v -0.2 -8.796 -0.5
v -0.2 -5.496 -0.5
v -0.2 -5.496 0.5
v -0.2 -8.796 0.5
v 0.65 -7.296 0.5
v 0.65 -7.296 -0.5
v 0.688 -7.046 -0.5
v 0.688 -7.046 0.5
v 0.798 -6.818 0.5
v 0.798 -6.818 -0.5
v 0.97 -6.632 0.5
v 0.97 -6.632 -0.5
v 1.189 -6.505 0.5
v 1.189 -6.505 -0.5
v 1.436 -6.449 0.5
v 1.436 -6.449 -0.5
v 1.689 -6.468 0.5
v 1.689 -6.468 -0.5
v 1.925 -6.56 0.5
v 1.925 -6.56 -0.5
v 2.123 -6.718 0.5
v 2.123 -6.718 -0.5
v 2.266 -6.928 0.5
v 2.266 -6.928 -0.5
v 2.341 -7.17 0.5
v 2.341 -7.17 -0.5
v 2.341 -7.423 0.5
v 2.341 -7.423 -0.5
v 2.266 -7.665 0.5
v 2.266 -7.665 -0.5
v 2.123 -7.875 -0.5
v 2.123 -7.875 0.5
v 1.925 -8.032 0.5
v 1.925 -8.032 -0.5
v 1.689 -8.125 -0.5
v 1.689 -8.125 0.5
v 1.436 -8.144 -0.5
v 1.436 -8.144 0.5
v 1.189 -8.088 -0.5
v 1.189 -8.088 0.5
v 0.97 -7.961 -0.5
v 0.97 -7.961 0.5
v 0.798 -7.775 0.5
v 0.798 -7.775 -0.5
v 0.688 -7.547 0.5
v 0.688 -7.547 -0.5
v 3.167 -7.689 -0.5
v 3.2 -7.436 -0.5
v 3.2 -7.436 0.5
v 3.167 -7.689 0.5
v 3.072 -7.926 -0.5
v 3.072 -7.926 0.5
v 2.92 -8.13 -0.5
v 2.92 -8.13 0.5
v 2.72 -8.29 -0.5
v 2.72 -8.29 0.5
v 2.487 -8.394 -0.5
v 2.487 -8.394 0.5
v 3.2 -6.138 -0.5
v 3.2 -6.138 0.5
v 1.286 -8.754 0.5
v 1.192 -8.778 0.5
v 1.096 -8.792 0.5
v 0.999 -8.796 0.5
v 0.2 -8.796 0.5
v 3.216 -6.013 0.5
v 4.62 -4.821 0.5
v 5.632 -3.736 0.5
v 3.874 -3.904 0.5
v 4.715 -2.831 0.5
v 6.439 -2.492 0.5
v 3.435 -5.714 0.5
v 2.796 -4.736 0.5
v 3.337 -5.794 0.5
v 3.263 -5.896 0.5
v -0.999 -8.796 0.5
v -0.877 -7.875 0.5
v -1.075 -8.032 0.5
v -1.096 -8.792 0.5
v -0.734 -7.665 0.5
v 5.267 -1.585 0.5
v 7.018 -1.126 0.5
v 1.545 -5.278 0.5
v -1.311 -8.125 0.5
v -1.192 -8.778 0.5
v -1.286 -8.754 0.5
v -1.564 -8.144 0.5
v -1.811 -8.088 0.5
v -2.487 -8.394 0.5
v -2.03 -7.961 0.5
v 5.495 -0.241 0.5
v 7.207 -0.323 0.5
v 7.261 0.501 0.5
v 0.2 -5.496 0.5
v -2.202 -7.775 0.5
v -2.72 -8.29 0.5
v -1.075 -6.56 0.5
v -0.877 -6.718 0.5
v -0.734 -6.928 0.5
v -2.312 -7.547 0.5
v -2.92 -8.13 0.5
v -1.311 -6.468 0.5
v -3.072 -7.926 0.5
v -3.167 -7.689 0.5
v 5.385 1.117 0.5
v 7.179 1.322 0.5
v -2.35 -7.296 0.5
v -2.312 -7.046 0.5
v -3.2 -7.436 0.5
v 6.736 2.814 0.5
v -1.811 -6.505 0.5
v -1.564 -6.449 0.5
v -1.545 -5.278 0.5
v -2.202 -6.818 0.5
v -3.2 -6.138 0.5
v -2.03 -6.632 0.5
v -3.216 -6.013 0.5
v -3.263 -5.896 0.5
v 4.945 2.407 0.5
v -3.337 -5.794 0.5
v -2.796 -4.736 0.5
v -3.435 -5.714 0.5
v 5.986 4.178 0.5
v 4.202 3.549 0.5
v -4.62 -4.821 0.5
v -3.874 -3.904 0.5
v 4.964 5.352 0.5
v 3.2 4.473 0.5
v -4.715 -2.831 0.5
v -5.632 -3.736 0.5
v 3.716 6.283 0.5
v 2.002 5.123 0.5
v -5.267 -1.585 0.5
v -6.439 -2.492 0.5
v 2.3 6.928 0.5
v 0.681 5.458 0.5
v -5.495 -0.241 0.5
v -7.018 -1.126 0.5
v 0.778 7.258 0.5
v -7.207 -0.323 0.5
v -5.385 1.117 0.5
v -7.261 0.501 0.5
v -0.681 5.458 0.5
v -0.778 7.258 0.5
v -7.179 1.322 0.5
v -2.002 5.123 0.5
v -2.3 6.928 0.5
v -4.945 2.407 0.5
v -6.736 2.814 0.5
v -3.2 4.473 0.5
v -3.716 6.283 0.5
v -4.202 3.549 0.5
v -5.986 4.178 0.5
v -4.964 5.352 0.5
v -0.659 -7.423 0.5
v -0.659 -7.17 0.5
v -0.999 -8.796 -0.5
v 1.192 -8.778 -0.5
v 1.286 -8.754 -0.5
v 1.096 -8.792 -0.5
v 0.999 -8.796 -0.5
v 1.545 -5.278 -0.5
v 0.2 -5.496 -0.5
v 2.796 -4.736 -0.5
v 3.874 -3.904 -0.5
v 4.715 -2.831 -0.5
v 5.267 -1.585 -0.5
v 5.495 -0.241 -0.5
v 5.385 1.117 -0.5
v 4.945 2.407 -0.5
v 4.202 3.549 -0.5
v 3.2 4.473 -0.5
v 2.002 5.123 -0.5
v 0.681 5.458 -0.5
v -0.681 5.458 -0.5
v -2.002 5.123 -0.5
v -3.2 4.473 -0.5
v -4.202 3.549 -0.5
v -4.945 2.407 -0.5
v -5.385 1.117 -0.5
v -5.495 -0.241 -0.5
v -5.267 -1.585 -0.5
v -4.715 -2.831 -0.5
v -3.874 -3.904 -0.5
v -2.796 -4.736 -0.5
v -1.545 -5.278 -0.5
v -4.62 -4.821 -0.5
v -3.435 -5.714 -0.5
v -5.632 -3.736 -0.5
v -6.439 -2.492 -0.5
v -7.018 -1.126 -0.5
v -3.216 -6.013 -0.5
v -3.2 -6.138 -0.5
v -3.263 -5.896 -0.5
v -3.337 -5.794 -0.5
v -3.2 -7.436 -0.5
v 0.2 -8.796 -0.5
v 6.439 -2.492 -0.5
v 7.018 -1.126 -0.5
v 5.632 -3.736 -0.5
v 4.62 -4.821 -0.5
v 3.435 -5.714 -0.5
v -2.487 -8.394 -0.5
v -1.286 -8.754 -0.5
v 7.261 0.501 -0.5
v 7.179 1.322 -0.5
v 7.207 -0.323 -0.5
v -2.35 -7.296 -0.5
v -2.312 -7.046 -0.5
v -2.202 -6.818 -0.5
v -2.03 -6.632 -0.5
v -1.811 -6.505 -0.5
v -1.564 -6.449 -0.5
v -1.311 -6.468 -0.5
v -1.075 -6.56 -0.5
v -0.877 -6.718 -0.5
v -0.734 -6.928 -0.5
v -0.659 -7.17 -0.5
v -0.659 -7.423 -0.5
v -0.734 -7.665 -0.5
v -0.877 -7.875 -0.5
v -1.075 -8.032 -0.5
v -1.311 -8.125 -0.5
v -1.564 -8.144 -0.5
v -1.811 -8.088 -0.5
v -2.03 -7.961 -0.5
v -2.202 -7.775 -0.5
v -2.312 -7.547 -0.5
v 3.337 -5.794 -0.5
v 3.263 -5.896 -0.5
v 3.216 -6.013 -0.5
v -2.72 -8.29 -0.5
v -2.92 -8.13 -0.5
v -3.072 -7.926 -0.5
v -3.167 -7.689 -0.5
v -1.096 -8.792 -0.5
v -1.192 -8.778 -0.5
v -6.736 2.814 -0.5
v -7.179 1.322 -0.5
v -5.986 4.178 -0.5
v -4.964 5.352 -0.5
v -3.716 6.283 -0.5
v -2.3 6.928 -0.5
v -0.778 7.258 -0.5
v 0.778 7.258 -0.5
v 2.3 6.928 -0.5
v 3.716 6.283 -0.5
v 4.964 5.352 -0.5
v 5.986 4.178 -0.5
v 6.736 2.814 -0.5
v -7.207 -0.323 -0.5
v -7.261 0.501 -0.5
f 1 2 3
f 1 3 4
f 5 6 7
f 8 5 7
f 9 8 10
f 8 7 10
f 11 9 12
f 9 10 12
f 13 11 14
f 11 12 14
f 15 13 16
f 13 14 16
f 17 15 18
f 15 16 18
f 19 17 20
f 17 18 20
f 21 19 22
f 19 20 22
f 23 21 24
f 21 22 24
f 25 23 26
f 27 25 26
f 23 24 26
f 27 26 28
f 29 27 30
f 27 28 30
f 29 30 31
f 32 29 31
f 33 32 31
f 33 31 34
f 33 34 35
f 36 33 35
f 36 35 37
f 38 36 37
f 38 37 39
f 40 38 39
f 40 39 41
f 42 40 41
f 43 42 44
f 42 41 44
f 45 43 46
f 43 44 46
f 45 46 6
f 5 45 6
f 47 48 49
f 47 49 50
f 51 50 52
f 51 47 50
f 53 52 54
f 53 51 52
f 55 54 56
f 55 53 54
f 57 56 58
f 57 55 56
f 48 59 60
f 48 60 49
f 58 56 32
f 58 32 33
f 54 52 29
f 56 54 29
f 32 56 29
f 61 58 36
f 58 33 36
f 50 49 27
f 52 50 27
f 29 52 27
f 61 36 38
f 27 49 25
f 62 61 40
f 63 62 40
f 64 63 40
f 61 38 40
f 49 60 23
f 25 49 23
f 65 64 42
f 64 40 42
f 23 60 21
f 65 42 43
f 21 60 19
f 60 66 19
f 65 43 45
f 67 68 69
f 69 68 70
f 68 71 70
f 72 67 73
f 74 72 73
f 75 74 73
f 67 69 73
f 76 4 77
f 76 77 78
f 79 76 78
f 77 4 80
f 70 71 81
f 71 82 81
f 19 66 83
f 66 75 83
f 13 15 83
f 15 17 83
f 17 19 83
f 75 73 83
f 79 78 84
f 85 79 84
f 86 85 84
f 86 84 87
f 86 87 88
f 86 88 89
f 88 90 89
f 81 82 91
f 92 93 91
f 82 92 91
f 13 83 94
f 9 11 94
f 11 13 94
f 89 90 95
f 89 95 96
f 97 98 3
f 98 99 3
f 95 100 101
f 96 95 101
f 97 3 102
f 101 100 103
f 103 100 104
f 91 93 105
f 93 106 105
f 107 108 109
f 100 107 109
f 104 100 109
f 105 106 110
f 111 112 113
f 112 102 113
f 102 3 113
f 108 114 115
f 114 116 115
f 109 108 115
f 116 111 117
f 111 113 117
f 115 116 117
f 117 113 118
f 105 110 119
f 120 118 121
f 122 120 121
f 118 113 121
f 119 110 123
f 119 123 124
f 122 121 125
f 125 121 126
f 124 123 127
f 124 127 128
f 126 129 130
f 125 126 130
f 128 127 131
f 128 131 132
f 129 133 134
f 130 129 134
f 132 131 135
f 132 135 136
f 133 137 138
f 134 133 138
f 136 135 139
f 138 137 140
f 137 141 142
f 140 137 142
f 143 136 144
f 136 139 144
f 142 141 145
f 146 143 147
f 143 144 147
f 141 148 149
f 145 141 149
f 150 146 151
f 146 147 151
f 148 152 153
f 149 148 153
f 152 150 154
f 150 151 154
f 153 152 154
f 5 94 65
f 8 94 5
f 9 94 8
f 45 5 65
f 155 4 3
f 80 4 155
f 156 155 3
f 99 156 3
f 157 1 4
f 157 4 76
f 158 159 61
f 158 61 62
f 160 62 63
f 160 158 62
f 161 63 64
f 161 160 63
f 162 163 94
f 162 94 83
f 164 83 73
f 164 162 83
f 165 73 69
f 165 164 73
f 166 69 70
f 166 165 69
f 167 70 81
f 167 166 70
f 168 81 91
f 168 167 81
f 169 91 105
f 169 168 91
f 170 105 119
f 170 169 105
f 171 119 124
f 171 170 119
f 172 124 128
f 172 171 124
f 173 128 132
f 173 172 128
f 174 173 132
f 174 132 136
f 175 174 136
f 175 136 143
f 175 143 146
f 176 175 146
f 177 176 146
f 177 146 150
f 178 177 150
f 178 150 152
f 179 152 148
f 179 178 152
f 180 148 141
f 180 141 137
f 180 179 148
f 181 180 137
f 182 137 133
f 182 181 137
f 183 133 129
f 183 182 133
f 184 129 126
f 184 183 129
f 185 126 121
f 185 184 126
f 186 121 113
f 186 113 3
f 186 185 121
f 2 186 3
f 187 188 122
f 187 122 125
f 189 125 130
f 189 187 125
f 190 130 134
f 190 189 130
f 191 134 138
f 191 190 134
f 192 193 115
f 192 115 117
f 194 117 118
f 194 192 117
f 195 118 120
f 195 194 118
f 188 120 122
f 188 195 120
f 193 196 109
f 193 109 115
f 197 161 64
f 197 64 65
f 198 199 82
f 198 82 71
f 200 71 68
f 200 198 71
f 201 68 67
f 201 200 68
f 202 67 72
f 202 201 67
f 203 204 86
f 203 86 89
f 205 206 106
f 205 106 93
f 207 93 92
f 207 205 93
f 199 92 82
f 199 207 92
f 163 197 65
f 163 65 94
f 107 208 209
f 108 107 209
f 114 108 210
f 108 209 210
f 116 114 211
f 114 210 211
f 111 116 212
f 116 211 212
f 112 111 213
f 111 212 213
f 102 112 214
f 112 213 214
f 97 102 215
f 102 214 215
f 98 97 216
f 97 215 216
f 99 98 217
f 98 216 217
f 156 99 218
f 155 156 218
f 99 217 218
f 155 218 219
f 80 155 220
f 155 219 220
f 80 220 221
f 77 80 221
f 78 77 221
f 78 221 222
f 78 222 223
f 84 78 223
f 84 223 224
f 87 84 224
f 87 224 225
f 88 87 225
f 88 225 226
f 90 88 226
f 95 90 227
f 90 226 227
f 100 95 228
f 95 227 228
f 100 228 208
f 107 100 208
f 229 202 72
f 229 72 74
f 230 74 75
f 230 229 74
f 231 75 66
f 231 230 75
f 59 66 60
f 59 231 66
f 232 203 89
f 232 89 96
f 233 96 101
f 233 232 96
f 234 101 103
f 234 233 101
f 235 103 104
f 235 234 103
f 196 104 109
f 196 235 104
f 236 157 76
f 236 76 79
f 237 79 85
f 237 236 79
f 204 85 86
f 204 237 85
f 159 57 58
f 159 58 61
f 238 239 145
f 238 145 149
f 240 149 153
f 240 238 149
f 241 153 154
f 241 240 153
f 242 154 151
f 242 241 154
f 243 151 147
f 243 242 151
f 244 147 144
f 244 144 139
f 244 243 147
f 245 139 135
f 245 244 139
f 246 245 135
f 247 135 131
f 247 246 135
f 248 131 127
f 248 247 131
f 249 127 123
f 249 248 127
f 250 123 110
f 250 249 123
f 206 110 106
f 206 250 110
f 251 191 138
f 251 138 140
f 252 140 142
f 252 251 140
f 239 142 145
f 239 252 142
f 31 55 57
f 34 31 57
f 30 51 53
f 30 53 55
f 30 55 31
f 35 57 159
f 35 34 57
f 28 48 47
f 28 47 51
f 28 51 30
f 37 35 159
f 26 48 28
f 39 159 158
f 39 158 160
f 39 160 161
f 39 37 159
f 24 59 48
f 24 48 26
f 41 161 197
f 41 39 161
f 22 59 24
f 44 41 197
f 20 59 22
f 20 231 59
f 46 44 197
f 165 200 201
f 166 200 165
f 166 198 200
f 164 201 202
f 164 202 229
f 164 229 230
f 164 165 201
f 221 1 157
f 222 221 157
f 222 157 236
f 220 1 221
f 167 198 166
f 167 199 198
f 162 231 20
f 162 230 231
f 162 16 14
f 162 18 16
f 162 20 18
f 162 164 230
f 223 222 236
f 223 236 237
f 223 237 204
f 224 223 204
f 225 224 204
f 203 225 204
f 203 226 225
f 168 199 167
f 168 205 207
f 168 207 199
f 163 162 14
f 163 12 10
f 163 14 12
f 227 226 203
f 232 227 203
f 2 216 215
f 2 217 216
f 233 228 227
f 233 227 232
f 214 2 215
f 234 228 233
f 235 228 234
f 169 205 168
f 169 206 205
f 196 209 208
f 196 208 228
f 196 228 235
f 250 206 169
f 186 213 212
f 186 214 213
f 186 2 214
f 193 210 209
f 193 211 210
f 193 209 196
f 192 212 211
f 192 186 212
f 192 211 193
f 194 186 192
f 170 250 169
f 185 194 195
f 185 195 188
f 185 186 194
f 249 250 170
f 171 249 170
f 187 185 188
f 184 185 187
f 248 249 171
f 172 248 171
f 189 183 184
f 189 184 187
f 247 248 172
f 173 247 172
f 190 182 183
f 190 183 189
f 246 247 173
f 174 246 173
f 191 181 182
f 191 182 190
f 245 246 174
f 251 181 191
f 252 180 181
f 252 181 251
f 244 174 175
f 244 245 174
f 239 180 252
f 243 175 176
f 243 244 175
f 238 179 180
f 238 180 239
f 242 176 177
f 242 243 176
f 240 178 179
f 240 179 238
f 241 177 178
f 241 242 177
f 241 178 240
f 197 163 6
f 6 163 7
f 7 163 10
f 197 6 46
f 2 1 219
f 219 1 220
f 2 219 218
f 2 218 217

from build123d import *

# Parameters (mm, degrees)
SKETCH1_R           = 0.85
BOSS_EXTRUDE1_DEPTH = 1


with BuildPart() as part:
    # Sketch1 → Boss-Extrude1 (new body)
    with BuildSketch(Plane(origin=(0, 0, -0.5), x_dir=(-1, 0, 0), z_dir=(0, 0, -1))):
        with BuildLine():
            Line((-3.2, -6.138229217), (-3.2, -7.435859975))
            ThreePointArc((-3.2, -7.435859975), (-3.002328658, -8.03274248), (-2.487462552, -8.393651853))
            Line((-2.487462552, -8.393651853), (-1.286310177, -8.754154311))
            ThreePointArc((-1.286310177, -8.754154311), (-1.144119993, -8.785754135), (-0.998847625, -8.796362433))
            Line((-0.998847625, -8.796362433), (-0.2, -8.796362433))
            Line((-0.2, -8.796362433), (-0.2, -5.496362433))
            ThreePointArc((-0.2, -5.496362433), (0, 5.5), (0.2, -5.496362433))
            Line((0.2, -5.496362433), (0.2, -8.796362433))
            Line((0.2, -8.796362433), (0.998847625, -8.796362433))
            ThreePointArc((0.998847625, -8.796362433), (1.144119993, -8.785754135), (1.286310177, -8.754154311))
            Line((1.286310177, -8.754154311), (2.487462552, -8.393651853))
            ThreePointArc((2.487462552, -8.393651853), (3.002328658, -8.03274248), (3.2, -7.435859975))
            Line((3.2, -7.435859975), (3.2, -6.138229217))
            ThreePointArc((3.2, -6.138229217), (3.262706314, -5.895795241), (3.43509693, -5.71416983))
            ThreePointArc((3.43509693, -5.71416983), (5.631574679, -3.736271631), (7.018174039, -1.125919546))
            ThreePointArc((7.018174039, -1.125919546), (7.251184268, 0.087807561), (7.179369434, 1.32161058))
            ThreePointArc((7.179369434, 1.32161058), (0, 7.3), (-7.179369434, 1.32161058))
            ThreePointArc((-7.179369434, 1.32161058), (-7.251184268, 0.087807561), (-7.018174039, -1.125919546))
            ThreePointArc((-7.018174039, -1.125919546), (-5.631574679, -3.736271631), (-3.43509693, -5.71416983))
            ThreePointArc((-3.43509693, -5.71416983), (-3.262706314, -5.895795241), (-3.2, -6.138229217))
        make_face()
        with Locations((-1.5, -7.296362433)):
            Circle(SKETCH1_R, mode=Mode.SUBTRACT)
        with Locations((1.5, -7.296362433)):
            Circle(SKETCH1_R, mode=Mode.SUBTRACT)
    extrude(amount=-BOSS_EXTRUDE1_DEPTH)


solid = part.part
